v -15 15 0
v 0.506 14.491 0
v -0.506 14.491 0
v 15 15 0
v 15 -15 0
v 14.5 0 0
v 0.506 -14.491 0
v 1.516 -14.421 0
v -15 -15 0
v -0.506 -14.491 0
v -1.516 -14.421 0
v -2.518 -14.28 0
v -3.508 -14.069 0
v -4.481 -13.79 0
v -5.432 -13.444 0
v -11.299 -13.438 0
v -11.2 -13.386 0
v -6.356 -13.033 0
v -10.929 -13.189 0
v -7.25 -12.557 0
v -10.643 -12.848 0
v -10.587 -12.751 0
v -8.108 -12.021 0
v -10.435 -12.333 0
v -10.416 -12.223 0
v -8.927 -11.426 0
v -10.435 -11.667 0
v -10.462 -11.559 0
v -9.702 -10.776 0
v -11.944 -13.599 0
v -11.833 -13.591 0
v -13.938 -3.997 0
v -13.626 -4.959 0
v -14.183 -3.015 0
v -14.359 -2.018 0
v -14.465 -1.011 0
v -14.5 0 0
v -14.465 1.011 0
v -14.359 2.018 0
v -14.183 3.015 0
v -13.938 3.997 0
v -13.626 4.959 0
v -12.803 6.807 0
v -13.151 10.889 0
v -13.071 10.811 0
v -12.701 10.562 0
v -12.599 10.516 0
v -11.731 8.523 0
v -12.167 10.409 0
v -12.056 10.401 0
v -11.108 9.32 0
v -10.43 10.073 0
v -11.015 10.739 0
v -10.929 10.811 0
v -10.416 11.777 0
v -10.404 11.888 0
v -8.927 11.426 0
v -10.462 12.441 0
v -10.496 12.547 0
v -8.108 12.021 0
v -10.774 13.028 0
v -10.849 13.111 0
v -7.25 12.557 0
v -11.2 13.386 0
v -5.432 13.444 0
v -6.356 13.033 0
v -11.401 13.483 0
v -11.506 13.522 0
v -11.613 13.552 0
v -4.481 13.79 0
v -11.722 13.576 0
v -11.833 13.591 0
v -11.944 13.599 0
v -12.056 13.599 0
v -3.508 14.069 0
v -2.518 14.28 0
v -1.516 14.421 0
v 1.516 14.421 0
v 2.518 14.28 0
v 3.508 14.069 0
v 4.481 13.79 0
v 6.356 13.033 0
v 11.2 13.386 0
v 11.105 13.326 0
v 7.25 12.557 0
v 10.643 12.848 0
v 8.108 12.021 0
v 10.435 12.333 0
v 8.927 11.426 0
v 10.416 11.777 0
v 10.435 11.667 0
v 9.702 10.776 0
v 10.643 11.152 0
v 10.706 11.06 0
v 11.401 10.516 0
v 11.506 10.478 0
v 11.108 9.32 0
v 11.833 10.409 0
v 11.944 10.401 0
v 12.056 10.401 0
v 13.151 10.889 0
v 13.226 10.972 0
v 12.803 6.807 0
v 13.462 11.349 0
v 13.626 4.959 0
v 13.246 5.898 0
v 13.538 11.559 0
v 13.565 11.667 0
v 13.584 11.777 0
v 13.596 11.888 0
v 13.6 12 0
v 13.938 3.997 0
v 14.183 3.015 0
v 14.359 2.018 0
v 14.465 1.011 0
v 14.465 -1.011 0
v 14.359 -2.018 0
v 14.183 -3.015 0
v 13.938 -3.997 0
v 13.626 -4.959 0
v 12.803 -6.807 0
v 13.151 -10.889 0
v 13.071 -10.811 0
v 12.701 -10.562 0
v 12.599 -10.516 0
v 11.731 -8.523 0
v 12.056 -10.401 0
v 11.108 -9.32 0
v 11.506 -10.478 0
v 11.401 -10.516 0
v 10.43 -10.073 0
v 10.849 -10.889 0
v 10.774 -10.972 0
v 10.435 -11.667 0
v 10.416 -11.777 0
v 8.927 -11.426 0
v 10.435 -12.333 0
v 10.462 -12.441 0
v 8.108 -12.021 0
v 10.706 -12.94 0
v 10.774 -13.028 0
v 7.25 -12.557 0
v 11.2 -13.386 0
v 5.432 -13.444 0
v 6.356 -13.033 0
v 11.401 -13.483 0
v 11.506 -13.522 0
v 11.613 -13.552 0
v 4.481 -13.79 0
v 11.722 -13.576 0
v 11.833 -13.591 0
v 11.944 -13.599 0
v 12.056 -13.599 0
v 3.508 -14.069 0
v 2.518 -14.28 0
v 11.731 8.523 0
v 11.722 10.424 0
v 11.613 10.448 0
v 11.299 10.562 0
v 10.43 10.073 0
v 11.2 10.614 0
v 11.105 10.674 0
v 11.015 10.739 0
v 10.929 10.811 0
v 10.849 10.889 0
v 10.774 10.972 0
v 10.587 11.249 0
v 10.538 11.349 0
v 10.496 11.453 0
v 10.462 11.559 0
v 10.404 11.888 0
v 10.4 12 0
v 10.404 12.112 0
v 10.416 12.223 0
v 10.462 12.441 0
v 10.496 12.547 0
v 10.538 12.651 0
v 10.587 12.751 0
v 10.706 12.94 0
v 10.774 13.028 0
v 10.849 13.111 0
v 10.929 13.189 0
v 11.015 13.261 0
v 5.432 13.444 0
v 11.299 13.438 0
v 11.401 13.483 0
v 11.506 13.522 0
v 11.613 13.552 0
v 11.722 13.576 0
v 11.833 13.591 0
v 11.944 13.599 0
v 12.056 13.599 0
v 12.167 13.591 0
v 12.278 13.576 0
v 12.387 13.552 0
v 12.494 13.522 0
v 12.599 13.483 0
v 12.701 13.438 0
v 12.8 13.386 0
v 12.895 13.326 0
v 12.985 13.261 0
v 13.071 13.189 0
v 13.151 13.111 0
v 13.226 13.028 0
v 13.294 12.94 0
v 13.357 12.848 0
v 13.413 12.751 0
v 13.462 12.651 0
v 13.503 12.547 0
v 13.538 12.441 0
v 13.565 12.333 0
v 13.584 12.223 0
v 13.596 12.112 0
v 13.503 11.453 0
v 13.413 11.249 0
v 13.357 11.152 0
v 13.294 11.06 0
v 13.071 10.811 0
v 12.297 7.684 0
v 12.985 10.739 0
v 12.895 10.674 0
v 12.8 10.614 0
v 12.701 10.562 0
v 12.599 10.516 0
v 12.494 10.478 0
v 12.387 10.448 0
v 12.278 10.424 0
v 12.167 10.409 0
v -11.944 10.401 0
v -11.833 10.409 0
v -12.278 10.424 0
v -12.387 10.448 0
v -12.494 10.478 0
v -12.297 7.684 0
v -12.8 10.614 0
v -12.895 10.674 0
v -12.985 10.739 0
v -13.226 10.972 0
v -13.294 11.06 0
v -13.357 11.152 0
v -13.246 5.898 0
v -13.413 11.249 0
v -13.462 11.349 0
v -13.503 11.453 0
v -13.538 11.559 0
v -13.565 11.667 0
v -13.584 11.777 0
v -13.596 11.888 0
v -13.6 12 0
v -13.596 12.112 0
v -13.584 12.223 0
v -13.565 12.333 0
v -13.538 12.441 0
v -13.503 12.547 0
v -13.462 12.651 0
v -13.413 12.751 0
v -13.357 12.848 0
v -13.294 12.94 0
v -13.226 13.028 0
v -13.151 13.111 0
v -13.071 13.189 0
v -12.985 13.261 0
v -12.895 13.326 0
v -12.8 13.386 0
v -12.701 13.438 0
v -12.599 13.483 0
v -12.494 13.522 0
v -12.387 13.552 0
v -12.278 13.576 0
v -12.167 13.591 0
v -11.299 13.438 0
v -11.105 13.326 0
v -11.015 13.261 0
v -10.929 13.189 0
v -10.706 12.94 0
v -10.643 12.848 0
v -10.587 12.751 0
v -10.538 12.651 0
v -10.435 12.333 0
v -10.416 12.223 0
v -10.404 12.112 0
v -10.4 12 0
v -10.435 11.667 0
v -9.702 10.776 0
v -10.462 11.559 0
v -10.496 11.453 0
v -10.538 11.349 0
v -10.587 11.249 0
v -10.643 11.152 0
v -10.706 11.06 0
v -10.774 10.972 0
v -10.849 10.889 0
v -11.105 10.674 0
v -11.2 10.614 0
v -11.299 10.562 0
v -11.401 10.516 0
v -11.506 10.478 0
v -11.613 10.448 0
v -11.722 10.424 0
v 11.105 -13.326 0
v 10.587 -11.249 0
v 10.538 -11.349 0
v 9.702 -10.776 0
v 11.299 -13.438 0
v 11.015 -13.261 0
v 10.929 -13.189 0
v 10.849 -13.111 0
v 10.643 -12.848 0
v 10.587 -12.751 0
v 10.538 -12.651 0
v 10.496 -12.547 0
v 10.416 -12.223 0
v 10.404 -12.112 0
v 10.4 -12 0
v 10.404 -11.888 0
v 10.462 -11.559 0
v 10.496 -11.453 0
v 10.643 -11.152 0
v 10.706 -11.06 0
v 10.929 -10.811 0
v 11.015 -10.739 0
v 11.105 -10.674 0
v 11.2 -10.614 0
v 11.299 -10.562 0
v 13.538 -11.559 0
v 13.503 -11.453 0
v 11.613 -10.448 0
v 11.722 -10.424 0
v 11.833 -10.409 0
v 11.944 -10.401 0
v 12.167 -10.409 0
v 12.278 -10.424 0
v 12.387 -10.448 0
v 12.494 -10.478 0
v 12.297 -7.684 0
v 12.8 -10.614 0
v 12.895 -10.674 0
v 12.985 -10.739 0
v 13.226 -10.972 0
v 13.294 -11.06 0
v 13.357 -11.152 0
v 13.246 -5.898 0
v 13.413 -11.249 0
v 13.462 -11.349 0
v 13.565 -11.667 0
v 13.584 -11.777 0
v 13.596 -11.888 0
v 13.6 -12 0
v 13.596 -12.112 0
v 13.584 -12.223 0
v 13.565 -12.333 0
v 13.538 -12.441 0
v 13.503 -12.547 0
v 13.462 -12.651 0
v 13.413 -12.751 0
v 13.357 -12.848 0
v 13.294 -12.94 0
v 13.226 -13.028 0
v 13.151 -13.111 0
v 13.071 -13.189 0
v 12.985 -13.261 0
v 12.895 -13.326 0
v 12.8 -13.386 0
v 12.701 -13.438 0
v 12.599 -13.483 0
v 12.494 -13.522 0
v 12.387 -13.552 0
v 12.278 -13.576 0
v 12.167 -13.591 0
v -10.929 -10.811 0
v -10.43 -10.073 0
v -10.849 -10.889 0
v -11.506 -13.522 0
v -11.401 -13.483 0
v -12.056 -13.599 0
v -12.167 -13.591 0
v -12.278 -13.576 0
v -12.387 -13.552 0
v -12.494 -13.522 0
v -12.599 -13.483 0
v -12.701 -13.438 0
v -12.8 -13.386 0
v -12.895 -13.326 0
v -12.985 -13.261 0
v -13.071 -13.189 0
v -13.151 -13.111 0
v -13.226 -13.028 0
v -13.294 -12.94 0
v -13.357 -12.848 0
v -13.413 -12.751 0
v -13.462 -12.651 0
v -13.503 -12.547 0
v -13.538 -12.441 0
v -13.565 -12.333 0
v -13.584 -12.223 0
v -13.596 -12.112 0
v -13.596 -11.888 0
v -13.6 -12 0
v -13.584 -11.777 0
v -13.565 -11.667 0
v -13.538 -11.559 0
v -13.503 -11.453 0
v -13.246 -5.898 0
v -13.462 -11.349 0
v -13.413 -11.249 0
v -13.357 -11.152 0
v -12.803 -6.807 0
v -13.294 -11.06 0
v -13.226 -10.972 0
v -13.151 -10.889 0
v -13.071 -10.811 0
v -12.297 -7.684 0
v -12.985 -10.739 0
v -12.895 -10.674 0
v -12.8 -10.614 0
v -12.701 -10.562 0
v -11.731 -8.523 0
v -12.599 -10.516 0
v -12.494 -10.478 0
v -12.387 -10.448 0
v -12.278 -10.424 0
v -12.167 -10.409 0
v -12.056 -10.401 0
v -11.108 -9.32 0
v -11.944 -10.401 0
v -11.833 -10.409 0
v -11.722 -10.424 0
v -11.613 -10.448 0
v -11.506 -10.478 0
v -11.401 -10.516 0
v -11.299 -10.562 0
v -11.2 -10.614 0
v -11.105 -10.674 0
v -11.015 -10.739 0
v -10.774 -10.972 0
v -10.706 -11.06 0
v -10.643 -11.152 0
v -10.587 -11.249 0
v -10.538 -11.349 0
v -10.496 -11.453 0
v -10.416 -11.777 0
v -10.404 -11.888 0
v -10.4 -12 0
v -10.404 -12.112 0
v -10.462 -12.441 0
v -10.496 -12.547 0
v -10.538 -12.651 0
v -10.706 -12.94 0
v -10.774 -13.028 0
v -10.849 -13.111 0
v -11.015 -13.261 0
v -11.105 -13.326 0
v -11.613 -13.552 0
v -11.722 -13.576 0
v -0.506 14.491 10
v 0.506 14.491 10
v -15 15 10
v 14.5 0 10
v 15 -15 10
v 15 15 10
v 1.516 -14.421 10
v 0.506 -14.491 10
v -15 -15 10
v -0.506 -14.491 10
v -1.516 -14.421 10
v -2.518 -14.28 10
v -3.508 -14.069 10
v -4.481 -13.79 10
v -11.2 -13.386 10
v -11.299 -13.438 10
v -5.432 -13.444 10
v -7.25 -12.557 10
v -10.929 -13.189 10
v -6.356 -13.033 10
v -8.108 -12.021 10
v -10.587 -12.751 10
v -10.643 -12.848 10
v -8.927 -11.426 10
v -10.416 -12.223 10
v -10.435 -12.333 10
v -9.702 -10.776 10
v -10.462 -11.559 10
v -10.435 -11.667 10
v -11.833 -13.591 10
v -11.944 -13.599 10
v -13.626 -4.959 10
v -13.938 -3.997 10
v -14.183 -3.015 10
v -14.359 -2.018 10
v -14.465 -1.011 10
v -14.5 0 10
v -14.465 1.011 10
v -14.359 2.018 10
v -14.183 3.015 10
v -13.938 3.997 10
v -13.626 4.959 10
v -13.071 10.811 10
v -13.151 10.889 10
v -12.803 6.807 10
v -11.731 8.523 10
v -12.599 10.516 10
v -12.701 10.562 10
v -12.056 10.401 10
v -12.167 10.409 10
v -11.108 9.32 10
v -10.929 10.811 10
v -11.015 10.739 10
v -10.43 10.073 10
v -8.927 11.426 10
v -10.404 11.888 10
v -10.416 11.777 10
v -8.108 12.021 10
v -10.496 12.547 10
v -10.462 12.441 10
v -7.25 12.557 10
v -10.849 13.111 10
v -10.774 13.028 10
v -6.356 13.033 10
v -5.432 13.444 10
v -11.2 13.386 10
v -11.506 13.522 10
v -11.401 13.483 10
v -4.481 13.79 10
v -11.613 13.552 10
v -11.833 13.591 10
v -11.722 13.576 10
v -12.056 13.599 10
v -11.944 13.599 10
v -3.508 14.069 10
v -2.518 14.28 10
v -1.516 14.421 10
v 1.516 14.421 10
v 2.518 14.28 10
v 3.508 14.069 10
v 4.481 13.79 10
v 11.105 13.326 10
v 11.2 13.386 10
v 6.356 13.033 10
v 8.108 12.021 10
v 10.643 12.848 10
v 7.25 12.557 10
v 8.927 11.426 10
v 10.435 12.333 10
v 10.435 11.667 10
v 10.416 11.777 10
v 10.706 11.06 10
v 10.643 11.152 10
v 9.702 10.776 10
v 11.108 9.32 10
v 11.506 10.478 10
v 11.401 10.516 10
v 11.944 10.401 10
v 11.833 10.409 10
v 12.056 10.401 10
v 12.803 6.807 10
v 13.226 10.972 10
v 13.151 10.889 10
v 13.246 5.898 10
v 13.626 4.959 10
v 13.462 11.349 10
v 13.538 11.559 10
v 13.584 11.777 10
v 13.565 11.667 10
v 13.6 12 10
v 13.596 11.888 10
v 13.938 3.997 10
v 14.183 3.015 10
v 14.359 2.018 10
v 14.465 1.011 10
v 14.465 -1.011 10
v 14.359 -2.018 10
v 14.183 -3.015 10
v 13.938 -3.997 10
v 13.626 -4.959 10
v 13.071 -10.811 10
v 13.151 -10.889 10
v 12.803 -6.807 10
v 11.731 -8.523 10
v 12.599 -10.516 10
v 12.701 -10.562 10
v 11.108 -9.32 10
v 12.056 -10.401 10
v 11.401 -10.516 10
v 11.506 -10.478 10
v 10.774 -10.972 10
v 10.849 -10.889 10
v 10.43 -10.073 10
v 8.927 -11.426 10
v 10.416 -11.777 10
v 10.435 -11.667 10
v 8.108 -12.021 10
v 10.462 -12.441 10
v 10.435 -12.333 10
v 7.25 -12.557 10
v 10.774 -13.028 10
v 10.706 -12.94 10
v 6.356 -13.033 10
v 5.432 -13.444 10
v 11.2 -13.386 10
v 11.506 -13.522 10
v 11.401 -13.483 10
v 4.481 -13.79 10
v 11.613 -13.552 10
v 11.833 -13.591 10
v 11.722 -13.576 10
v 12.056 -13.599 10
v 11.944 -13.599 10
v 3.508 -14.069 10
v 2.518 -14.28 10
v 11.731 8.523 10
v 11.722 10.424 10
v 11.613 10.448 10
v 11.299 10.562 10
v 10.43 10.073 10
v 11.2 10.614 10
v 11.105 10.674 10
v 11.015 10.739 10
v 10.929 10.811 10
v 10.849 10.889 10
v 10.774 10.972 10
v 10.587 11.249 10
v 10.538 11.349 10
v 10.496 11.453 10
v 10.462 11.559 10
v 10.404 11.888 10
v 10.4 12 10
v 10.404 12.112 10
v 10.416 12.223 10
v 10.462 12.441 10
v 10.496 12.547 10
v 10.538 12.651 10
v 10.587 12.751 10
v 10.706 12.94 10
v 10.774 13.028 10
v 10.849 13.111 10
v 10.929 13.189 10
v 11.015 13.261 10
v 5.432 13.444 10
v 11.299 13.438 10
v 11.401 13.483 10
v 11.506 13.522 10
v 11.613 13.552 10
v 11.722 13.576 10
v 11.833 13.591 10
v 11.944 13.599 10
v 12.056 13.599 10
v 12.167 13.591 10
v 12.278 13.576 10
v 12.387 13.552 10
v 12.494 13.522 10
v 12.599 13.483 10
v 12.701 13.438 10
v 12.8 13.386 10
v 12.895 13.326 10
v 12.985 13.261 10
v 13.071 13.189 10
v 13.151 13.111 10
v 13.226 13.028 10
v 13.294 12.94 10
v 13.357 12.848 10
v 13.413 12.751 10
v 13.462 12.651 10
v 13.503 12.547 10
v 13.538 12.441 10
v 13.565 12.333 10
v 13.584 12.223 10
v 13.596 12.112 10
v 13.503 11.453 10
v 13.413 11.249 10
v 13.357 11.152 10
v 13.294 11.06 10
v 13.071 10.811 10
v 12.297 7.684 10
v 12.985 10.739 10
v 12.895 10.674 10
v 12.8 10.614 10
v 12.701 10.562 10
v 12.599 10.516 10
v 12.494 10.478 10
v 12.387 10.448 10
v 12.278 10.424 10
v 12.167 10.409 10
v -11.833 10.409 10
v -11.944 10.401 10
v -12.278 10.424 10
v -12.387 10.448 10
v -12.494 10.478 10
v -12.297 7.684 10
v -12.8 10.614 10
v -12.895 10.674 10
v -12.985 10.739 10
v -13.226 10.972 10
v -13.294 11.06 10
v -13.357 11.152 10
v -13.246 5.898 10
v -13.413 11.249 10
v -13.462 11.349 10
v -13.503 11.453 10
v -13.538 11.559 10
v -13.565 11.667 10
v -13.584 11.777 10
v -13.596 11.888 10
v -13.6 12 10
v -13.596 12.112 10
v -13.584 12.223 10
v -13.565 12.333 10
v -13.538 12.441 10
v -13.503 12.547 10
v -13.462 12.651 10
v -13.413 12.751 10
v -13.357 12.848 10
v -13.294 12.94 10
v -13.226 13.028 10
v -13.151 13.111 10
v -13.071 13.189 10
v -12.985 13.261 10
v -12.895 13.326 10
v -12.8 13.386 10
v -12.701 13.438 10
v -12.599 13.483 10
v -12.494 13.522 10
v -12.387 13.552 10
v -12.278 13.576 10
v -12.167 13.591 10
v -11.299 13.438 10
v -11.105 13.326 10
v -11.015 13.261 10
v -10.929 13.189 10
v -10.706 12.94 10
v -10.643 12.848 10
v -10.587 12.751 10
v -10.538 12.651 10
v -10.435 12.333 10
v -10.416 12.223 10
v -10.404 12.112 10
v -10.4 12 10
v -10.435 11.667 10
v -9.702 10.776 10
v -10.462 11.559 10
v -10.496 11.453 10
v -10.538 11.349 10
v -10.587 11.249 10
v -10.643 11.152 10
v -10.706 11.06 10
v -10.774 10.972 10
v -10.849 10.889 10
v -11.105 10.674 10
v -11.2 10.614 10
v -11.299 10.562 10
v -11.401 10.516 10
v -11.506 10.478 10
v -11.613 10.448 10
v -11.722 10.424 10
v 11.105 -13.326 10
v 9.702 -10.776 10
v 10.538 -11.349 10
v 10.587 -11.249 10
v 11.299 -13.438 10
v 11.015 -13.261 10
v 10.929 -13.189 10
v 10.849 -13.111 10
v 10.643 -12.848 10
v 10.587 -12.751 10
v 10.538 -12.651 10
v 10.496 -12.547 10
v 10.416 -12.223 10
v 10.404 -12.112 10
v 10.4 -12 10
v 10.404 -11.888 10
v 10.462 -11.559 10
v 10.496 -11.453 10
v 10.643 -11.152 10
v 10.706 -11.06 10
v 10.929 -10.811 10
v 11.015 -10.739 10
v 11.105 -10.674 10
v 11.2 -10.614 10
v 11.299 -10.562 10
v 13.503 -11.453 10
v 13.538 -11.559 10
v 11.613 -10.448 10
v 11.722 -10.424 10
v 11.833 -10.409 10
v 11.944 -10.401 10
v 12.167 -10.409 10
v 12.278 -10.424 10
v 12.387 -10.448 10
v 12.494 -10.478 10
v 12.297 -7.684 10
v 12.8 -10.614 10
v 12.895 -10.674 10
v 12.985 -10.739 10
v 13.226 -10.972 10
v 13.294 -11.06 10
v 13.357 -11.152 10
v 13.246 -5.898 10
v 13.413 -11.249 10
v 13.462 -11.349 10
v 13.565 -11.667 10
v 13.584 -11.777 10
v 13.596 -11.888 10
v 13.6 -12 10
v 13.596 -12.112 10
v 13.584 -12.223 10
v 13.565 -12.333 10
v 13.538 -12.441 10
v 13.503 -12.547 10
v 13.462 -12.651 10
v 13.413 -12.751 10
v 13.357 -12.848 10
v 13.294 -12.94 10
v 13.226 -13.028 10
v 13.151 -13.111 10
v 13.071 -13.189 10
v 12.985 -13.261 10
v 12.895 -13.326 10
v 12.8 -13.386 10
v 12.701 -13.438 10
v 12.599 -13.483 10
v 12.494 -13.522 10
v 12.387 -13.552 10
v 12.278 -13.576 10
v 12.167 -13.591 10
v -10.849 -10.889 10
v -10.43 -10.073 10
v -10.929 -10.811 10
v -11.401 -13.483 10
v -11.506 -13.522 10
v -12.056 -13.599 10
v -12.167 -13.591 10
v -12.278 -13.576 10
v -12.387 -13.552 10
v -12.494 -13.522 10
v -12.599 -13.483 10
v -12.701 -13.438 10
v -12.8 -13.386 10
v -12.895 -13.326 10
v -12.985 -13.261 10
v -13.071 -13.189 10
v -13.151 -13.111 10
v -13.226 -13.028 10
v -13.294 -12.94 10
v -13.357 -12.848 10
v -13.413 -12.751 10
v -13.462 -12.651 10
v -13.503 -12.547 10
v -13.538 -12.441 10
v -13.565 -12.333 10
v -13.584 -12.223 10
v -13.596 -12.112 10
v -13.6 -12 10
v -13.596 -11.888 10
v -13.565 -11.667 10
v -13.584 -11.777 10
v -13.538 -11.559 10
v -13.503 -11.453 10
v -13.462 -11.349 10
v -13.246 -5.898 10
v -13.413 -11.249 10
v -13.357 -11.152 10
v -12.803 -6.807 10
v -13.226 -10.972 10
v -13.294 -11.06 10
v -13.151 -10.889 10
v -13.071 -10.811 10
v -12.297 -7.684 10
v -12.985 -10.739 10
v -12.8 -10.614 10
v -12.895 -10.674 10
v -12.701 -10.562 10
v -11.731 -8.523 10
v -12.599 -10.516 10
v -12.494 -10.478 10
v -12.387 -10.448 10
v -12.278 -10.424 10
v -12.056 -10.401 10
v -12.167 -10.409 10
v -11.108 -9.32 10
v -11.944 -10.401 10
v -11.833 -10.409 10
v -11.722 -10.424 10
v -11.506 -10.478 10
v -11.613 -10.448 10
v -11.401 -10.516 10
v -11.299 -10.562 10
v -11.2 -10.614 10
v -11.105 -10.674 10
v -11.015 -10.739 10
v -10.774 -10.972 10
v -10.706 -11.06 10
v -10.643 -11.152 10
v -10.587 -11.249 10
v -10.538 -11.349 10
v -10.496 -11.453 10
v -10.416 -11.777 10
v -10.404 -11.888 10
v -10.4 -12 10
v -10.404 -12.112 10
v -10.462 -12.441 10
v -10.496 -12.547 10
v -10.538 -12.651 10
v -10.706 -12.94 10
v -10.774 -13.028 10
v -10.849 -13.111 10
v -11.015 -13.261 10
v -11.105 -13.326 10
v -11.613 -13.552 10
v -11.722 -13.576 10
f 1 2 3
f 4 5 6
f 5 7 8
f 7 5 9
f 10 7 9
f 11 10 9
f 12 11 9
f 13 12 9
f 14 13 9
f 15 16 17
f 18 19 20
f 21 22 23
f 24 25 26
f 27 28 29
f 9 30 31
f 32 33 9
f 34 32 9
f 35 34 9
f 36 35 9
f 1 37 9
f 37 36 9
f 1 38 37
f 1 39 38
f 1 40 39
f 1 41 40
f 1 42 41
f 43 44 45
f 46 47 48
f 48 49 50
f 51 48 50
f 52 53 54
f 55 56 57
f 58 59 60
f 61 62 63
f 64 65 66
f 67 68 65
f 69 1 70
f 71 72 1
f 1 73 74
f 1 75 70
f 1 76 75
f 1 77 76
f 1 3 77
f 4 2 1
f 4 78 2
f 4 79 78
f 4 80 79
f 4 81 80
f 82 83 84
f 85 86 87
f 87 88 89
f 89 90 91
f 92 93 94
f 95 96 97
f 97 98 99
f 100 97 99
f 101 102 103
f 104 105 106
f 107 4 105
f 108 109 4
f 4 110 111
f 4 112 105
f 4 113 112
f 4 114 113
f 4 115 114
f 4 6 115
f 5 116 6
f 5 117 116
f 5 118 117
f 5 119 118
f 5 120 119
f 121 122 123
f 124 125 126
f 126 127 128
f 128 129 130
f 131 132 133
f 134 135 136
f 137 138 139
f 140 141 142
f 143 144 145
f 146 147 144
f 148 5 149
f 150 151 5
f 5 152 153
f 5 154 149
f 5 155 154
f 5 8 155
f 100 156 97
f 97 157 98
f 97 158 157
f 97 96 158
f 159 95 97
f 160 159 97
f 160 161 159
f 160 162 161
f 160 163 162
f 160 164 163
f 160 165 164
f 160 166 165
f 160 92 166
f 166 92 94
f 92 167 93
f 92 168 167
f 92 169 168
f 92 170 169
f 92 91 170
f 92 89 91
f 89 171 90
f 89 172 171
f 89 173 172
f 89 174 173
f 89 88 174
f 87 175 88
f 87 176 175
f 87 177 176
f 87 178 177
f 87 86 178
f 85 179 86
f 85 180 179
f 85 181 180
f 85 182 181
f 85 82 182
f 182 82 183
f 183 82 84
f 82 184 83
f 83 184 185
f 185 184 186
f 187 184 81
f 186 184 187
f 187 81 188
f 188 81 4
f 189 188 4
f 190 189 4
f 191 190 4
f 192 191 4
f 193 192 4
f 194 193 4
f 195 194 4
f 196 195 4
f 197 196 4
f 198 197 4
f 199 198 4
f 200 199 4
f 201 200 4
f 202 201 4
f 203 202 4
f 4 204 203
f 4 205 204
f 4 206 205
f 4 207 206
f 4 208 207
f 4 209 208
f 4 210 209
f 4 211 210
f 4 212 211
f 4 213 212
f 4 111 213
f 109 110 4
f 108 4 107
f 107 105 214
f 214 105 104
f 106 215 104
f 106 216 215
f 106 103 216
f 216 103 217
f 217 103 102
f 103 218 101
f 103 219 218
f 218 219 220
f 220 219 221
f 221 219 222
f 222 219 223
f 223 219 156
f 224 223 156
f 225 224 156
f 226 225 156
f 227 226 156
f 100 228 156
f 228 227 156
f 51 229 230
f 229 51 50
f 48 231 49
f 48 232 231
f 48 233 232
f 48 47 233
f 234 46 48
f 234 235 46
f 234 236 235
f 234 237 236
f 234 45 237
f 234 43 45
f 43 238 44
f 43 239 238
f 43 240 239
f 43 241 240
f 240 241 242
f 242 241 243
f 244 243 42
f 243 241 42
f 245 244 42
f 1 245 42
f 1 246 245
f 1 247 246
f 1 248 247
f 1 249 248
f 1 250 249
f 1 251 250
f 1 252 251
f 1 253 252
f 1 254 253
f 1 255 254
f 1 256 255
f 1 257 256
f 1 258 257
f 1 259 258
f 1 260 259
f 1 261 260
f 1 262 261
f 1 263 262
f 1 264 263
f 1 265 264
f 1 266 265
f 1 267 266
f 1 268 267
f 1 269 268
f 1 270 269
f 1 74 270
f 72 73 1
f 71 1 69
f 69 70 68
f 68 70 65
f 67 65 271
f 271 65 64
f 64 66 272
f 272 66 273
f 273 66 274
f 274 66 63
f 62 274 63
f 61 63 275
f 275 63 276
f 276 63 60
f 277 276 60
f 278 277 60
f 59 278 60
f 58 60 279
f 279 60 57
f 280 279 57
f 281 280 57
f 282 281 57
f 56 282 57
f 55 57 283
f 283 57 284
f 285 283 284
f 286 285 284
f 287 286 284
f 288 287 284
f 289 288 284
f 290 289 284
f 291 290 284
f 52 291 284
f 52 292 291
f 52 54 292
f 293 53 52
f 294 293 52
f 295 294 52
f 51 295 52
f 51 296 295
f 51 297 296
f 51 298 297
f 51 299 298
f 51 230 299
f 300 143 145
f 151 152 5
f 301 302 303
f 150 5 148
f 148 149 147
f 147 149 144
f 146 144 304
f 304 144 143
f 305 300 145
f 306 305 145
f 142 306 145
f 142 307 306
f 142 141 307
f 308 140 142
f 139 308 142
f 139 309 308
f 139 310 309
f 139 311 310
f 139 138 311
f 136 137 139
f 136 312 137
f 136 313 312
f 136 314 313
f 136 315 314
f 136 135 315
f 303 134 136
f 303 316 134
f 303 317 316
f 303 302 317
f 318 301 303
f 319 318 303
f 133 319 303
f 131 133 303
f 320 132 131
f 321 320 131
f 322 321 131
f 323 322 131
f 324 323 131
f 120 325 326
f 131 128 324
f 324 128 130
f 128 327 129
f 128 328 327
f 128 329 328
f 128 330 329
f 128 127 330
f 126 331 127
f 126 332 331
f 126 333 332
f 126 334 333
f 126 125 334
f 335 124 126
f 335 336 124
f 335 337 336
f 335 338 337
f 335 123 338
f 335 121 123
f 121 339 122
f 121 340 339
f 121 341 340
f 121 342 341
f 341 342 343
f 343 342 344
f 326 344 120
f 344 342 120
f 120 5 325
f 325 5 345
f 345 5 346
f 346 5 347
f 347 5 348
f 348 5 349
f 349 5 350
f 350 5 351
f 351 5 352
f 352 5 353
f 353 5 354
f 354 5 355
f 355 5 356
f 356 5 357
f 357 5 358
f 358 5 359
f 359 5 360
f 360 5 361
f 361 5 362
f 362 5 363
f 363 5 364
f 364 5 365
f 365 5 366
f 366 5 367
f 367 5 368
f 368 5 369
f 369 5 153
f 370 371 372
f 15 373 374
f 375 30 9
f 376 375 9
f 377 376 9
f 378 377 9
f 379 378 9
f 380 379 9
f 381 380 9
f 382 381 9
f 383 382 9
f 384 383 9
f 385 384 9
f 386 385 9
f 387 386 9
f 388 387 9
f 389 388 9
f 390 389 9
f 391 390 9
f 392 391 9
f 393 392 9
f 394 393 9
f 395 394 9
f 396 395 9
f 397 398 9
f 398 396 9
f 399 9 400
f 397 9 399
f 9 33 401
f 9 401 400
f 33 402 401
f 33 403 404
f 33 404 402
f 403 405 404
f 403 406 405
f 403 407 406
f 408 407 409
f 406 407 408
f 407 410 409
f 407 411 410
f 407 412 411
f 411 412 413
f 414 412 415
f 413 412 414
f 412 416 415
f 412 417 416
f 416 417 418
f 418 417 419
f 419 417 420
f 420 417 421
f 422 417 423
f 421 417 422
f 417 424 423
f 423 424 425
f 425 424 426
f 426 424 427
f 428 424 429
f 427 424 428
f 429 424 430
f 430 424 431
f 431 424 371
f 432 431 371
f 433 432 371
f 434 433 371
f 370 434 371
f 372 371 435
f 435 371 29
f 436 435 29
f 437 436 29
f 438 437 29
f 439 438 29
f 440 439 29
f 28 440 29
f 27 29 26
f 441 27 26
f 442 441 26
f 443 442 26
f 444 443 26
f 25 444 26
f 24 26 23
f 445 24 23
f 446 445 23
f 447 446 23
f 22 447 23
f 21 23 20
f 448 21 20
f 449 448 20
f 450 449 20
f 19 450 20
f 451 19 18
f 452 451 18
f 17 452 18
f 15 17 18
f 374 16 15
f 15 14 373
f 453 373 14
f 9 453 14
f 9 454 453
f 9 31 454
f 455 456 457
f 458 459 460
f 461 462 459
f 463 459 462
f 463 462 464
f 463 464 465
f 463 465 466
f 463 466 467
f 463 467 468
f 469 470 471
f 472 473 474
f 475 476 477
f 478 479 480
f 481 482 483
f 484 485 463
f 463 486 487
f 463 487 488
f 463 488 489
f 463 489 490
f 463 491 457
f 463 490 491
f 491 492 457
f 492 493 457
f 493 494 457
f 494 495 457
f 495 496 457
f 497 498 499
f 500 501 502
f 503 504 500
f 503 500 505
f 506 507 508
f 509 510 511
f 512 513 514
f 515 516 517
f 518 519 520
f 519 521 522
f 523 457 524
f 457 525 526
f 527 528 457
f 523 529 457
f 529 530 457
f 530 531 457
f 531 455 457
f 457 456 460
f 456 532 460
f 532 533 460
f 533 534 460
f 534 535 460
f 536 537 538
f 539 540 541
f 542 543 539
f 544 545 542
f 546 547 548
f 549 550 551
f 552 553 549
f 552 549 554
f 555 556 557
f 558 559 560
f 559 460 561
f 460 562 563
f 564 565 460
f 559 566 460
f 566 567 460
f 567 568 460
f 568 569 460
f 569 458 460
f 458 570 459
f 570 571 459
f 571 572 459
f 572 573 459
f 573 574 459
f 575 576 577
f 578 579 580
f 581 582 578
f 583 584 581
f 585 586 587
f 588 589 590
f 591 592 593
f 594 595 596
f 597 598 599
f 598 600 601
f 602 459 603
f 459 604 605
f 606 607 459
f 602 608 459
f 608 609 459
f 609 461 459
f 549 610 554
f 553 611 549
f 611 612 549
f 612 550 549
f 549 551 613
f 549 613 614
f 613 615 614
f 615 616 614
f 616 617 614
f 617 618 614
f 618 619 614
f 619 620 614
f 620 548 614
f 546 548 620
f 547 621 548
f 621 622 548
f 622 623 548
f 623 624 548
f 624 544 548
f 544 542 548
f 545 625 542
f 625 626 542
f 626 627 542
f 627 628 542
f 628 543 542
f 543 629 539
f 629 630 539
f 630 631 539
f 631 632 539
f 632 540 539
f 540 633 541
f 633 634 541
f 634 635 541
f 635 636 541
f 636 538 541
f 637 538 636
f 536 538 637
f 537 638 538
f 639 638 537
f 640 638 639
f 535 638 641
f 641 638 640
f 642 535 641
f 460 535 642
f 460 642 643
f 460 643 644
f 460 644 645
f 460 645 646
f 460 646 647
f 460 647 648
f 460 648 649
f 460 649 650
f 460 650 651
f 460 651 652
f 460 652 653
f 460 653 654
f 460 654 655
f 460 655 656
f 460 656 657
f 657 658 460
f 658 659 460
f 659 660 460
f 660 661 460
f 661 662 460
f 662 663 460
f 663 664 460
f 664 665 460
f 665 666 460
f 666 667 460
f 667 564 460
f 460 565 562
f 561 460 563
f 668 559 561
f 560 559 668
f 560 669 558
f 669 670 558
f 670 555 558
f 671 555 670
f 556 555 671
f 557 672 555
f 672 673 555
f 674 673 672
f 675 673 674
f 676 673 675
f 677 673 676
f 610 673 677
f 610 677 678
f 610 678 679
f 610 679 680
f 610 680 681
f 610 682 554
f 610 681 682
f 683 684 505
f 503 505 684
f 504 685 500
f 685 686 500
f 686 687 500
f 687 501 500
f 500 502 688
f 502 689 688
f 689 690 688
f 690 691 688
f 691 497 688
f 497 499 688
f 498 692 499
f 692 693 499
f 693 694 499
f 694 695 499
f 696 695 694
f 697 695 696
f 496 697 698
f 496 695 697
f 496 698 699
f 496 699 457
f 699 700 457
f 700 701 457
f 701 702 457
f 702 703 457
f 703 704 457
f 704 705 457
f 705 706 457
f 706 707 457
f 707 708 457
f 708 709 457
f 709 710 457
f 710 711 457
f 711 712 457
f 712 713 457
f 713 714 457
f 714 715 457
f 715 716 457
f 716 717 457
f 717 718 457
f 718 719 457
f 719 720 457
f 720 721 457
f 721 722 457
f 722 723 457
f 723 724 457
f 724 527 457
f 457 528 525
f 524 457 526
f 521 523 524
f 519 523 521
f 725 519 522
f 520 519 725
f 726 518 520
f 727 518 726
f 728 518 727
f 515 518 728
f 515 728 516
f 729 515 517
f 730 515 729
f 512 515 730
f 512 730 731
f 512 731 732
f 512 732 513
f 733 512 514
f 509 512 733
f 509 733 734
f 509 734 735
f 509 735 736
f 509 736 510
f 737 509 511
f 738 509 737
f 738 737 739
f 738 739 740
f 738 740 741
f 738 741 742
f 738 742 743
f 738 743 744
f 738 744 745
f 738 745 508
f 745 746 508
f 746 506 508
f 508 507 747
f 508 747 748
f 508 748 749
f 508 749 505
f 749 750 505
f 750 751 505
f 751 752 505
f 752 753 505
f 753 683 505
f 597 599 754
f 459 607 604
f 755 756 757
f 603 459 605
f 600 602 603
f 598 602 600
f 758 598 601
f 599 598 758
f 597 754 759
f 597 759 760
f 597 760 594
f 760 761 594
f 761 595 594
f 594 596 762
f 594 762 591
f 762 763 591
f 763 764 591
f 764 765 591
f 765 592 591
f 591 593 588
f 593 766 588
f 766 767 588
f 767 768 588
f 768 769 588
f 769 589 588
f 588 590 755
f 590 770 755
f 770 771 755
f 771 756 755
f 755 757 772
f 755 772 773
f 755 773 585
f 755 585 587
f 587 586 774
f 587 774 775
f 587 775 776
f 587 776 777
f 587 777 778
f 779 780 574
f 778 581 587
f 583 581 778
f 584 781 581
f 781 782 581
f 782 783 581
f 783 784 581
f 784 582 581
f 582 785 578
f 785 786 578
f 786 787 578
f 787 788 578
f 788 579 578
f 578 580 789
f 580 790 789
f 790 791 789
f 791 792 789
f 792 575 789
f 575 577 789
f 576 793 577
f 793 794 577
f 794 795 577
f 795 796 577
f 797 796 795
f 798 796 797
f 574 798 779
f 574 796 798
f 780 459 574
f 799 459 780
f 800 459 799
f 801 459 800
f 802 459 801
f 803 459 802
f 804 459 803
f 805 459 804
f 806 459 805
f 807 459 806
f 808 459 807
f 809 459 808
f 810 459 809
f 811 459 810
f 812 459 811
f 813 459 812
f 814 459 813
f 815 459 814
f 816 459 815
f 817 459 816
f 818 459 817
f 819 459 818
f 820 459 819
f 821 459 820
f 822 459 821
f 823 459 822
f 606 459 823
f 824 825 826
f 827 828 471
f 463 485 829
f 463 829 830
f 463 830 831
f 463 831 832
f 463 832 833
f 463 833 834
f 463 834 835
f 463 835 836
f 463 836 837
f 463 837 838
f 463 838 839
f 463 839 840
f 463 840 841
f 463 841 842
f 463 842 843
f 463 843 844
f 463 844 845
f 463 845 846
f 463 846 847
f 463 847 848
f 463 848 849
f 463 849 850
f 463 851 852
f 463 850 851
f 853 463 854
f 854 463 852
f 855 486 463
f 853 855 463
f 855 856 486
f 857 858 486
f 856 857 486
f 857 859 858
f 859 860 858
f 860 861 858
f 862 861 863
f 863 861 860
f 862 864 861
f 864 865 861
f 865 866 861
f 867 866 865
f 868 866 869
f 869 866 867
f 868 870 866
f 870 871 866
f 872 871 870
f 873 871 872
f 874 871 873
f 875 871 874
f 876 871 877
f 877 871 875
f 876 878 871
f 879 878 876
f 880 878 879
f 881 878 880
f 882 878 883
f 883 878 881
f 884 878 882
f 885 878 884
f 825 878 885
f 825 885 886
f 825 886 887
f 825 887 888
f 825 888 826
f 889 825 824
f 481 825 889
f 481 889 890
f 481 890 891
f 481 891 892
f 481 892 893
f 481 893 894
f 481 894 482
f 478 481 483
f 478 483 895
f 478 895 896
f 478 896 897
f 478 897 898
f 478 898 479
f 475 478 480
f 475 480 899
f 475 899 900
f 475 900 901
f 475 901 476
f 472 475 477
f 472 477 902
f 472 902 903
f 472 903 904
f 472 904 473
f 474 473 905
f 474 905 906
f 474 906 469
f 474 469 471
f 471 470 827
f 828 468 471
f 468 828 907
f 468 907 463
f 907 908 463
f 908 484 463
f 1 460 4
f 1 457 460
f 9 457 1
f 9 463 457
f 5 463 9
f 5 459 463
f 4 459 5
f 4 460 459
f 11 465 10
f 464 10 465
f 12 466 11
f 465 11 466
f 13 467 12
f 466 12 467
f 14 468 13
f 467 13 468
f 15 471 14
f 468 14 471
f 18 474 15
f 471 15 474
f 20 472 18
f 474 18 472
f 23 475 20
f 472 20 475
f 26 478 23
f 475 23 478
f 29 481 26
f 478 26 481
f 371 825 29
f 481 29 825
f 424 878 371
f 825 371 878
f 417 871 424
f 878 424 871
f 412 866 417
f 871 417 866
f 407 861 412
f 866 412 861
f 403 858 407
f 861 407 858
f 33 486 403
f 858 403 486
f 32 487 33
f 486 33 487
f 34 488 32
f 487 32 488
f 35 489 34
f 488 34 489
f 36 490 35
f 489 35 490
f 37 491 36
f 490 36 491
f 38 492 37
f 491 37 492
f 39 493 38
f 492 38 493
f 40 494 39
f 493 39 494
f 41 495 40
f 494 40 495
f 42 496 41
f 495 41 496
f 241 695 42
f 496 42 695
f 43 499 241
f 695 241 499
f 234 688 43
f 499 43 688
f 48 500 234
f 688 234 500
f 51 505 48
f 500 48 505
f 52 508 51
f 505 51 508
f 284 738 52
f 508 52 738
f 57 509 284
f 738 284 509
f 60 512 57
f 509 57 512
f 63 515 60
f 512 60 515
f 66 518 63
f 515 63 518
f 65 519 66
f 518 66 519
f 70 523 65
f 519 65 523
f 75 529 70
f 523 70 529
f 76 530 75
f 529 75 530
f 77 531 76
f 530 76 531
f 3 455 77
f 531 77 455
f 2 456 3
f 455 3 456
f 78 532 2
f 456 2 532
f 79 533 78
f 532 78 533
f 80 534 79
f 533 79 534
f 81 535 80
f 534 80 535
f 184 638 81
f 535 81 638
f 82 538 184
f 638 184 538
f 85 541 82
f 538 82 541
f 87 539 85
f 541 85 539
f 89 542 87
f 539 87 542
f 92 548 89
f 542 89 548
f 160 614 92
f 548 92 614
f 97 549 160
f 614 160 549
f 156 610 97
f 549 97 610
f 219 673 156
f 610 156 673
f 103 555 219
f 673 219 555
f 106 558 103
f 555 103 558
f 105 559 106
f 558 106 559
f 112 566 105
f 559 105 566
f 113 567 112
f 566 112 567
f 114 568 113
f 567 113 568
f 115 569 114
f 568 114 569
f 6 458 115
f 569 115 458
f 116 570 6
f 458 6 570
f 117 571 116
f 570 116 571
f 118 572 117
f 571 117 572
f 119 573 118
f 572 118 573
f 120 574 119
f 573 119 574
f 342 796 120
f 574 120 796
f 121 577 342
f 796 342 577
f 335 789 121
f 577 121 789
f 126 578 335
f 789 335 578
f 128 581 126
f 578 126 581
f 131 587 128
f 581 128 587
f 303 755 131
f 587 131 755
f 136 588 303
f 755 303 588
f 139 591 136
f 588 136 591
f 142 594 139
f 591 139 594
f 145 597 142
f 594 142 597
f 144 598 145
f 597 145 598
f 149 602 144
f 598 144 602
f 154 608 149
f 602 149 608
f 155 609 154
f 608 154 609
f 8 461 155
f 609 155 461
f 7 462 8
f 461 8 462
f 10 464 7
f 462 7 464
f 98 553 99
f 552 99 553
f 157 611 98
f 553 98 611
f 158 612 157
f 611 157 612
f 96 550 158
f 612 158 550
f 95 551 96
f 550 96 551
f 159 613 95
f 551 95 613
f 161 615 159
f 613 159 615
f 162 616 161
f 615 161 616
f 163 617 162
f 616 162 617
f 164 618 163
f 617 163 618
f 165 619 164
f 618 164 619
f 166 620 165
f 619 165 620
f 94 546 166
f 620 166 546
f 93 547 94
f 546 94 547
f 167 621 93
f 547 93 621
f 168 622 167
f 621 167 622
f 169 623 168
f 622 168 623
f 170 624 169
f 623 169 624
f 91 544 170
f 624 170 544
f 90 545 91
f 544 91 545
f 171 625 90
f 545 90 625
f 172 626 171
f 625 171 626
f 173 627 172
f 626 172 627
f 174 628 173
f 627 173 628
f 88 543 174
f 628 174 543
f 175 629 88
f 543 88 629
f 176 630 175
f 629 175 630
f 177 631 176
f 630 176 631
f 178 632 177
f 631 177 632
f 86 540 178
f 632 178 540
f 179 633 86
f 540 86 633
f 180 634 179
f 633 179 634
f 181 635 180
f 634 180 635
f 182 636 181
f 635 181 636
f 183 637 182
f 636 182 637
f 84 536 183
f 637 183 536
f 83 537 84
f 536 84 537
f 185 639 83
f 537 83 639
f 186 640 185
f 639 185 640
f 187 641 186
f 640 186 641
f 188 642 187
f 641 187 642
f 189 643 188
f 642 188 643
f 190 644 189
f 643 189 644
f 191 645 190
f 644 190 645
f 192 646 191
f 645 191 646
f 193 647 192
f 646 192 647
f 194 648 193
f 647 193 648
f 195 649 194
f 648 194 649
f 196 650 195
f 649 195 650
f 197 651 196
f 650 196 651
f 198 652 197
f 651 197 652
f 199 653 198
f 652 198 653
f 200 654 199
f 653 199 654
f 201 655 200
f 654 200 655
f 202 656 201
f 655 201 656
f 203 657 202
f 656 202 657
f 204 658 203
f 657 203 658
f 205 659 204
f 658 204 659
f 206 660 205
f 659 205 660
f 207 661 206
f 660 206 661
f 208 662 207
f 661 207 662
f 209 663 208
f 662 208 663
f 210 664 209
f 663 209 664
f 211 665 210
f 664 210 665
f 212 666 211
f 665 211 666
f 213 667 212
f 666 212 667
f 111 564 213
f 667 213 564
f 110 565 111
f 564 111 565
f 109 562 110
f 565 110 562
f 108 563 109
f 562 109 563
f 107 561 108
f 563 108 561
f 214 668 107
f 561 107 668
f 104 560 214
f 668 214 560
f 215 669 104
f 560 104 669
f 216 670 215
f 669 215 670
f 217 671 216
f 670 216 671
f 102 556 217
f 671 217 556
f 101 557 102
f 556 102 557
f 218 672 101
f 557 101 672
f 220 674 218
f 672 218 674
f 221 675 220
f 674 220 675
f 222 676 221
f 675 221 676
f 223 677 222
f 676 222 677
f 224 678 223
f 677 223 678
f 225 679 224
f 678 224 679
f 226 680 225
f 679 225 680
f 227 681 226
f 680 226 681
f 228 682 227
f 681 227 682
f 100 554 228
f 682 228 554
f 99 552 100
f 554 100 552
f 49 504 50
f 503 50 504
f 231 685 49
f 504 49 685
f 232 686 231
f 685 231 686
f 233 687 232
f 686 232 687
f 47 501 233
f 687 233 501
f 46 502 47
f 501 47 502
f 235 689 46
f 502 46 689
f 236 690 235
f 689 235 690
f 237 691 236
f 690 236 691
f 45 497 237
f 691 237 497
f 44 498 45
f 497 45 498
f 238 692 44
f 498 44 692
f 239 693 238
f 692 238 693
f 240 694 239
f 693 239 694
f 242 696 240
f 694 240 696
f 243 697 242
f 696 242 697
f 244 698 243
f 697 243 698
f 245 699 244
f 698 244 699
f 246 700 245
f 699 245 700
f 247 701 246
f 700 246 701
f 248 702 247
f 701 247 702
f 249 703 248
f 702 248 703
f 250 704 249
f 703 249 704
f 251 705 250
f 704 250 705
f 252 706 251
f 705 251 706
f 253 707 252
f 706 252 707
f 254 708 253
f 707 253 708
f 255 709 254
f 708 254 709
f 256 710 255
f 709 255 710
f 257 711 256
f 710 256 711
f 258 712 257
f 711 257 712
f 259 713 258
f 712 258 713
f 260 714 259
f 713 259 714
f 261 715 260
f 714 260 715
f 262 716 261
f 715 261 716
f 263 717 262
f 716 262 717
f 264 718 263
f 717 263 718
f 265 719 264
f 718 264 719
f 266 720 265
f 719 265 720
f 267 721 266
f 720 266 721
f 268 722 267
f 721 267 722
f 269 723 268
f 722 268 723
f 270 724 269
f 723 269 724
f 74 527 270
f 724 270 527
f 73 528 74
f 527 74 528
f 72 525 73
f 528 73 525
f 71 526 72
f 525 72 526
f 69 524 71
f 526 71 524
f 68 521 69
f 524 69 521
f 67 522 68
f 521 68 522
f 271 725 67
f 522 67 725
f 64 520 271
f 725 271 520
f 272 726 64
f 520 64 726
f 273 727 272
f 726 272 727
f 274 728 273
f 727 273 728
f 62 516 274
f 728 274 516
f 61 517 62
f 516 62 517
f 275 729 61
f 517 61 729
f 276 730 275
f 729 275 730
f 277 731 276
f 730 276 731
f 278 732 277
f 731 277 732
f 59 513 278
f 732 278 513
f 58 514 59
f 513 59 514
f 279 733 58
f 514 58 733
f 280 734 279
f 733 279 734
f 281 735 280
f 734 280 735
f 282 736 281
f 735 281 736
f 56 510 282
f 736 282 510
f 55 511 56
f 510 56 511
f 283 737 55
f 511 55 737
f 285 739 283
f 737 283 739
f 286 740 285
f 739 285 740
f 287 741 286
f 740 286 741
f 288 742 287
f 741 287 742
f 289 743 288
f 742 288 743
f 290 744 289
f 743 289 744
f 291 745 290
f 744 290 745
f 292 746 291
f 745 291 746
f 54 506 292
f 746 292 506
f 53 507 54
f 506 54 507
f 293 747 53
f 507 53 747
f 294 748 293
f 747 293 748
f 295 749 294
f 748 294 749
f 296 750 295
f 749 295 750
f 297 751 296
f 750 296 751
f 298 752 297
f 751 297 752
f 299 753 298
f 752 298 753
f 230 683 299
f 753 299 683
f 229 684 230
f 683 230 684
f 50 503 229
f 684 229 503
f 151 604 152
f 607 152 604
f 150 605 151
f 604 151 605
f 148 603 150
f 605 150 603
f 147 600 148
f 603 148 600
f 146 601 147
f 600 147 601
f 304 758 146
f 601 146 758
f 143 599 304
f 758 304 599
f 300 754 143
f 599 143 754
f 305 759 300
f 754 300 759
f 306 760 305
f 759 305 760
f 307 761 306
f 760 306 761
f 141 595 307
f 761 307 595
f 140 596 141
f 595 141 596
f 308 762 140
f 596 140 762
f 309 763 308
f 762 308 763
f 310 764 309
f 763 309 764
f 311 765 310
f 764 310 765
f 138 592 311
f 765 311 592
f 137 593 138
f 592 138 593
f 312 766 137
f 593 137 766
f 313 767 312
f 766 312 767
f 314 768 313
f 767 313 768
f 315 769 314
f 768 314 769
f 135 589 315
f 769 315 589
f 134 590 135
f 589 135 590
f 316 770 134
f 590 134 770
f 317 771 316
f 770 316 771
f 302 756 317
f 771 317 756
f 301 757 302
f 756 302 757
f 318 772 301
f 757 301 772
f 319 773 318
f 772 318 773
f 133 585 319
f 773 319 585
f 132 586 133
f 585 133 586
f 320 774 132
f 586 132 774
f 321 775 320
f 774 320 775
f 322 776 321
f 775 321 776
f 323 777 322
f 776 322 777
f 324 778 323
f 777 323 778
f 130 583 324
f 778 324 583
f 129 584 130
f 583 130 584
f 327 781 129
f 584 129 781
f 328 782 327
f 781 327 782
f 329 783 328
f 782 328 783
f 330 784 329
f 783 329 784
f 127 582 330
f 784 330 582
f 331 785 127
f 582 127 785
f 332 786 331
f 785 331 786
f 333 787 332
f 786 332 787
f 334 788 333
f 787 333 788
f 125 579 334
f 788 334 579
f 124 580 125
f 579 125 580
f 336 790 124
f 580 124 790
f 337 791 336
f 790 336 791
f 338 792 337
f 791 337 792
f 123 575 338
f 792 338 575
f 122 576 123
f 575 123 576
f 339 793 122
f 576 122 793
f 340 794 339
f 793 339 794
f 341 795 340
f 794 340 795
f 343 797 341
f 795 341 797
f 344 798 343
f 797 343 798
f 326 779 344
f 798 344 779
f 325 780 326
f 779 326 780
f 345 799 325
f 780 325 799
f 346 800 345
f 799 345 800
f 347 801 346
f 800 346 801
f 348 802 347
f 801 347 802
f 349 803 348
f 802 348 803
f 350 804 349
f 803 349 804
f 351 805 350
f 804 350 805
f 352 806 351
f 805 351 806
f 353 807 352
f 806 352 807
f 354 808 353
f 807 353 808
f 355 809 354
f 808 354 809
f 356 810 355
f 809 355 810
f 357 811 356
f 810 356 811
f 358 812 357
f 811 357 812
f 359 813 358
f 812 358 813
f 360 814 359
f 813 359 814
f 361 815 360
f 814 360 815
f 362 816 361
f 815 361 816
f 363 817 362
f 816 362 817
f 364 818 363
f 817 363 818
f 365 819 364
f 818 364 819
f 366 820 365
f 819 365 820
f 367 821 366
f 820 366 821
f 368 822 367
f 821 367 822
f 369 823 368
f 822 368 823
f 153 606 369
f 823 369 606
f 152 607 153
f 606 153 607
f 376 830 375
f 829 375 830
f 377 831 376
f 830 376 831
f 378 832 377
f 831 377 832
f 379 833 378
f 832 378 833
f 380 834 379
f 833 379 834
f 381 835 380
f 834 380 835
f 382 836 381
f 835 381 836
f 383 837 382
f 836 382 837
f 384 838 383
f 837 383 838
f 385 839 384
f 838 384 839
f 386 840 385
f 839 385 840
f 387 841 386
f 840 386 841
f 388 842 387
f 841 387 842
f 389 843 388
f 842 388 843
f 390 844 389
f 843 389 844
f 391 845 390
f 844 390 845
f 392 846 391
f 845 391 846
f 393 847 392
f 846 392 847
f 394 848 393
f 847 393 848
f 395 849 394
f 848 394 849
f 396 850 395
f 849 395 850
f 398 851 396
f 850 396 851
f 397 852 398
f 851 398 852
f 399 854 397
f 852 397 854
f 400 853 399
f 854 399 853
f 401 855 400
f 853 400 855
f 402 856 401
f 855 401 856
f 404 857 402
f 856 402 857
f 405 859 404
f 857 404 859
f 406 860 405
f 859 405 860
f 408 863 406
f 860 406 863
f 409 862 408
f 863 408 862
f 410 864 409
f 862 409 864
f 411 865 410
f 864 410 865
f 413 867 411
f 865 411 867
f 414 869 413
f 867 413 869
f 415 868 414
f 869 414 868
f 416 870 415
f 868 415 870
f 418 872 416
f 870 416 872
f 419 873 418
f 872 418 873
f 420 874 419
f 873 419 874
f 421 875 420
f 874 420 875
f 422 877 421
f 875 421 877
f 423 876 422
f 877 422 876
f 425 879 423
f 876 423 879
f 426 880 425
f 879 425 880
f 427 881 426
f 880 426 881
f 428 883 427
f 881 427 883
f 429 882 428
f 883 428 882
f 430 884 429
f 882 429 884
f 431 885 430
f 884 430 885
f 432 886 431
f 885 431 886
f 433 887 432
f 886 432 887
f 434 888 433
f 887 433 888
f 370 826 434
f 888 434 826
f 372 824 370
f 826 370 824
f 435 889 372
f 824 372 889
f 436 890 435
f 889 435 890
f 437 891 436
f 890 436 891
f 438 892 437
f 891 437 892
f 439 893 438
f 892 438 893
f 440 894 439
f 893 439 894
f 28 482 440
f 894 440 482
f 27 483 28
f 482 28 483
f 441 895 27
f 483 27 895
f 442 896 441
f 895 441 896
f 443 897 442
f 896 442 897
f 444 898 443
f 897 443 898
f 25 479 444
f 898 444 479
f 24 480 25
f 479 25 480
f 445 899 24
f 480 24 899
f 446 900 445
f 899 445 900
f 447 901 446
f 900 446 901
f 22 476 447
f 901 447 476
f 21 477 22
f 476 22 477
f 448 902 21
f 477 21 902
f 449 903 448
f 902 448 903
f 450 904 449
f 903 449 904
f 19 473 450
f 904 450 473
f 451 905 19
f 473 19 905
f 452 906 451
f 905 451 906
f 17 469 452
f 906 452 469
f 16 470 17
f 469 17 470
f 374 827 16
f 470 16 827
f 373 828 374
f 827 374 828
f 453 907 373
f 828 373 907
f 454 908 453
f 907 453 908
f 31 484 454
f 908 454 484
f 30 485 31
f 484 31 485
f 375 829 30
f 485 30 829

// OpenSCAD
$fn = 90;

echo(version=version());

color("gray")

        linear_extrude(height = 10)
        difference(){
            square([30, 30], center = true);
            circle(14.5, center = true);
            translate([12, -12, 0])circle(1.6, center = true);
            translate([12, 12, 0])circle(1.6, center = true);
            translate([-12, 12, 0])circle(1.6, center = true);
            translate([-12, -12, 0])circle(1.6, center = true);
        }
